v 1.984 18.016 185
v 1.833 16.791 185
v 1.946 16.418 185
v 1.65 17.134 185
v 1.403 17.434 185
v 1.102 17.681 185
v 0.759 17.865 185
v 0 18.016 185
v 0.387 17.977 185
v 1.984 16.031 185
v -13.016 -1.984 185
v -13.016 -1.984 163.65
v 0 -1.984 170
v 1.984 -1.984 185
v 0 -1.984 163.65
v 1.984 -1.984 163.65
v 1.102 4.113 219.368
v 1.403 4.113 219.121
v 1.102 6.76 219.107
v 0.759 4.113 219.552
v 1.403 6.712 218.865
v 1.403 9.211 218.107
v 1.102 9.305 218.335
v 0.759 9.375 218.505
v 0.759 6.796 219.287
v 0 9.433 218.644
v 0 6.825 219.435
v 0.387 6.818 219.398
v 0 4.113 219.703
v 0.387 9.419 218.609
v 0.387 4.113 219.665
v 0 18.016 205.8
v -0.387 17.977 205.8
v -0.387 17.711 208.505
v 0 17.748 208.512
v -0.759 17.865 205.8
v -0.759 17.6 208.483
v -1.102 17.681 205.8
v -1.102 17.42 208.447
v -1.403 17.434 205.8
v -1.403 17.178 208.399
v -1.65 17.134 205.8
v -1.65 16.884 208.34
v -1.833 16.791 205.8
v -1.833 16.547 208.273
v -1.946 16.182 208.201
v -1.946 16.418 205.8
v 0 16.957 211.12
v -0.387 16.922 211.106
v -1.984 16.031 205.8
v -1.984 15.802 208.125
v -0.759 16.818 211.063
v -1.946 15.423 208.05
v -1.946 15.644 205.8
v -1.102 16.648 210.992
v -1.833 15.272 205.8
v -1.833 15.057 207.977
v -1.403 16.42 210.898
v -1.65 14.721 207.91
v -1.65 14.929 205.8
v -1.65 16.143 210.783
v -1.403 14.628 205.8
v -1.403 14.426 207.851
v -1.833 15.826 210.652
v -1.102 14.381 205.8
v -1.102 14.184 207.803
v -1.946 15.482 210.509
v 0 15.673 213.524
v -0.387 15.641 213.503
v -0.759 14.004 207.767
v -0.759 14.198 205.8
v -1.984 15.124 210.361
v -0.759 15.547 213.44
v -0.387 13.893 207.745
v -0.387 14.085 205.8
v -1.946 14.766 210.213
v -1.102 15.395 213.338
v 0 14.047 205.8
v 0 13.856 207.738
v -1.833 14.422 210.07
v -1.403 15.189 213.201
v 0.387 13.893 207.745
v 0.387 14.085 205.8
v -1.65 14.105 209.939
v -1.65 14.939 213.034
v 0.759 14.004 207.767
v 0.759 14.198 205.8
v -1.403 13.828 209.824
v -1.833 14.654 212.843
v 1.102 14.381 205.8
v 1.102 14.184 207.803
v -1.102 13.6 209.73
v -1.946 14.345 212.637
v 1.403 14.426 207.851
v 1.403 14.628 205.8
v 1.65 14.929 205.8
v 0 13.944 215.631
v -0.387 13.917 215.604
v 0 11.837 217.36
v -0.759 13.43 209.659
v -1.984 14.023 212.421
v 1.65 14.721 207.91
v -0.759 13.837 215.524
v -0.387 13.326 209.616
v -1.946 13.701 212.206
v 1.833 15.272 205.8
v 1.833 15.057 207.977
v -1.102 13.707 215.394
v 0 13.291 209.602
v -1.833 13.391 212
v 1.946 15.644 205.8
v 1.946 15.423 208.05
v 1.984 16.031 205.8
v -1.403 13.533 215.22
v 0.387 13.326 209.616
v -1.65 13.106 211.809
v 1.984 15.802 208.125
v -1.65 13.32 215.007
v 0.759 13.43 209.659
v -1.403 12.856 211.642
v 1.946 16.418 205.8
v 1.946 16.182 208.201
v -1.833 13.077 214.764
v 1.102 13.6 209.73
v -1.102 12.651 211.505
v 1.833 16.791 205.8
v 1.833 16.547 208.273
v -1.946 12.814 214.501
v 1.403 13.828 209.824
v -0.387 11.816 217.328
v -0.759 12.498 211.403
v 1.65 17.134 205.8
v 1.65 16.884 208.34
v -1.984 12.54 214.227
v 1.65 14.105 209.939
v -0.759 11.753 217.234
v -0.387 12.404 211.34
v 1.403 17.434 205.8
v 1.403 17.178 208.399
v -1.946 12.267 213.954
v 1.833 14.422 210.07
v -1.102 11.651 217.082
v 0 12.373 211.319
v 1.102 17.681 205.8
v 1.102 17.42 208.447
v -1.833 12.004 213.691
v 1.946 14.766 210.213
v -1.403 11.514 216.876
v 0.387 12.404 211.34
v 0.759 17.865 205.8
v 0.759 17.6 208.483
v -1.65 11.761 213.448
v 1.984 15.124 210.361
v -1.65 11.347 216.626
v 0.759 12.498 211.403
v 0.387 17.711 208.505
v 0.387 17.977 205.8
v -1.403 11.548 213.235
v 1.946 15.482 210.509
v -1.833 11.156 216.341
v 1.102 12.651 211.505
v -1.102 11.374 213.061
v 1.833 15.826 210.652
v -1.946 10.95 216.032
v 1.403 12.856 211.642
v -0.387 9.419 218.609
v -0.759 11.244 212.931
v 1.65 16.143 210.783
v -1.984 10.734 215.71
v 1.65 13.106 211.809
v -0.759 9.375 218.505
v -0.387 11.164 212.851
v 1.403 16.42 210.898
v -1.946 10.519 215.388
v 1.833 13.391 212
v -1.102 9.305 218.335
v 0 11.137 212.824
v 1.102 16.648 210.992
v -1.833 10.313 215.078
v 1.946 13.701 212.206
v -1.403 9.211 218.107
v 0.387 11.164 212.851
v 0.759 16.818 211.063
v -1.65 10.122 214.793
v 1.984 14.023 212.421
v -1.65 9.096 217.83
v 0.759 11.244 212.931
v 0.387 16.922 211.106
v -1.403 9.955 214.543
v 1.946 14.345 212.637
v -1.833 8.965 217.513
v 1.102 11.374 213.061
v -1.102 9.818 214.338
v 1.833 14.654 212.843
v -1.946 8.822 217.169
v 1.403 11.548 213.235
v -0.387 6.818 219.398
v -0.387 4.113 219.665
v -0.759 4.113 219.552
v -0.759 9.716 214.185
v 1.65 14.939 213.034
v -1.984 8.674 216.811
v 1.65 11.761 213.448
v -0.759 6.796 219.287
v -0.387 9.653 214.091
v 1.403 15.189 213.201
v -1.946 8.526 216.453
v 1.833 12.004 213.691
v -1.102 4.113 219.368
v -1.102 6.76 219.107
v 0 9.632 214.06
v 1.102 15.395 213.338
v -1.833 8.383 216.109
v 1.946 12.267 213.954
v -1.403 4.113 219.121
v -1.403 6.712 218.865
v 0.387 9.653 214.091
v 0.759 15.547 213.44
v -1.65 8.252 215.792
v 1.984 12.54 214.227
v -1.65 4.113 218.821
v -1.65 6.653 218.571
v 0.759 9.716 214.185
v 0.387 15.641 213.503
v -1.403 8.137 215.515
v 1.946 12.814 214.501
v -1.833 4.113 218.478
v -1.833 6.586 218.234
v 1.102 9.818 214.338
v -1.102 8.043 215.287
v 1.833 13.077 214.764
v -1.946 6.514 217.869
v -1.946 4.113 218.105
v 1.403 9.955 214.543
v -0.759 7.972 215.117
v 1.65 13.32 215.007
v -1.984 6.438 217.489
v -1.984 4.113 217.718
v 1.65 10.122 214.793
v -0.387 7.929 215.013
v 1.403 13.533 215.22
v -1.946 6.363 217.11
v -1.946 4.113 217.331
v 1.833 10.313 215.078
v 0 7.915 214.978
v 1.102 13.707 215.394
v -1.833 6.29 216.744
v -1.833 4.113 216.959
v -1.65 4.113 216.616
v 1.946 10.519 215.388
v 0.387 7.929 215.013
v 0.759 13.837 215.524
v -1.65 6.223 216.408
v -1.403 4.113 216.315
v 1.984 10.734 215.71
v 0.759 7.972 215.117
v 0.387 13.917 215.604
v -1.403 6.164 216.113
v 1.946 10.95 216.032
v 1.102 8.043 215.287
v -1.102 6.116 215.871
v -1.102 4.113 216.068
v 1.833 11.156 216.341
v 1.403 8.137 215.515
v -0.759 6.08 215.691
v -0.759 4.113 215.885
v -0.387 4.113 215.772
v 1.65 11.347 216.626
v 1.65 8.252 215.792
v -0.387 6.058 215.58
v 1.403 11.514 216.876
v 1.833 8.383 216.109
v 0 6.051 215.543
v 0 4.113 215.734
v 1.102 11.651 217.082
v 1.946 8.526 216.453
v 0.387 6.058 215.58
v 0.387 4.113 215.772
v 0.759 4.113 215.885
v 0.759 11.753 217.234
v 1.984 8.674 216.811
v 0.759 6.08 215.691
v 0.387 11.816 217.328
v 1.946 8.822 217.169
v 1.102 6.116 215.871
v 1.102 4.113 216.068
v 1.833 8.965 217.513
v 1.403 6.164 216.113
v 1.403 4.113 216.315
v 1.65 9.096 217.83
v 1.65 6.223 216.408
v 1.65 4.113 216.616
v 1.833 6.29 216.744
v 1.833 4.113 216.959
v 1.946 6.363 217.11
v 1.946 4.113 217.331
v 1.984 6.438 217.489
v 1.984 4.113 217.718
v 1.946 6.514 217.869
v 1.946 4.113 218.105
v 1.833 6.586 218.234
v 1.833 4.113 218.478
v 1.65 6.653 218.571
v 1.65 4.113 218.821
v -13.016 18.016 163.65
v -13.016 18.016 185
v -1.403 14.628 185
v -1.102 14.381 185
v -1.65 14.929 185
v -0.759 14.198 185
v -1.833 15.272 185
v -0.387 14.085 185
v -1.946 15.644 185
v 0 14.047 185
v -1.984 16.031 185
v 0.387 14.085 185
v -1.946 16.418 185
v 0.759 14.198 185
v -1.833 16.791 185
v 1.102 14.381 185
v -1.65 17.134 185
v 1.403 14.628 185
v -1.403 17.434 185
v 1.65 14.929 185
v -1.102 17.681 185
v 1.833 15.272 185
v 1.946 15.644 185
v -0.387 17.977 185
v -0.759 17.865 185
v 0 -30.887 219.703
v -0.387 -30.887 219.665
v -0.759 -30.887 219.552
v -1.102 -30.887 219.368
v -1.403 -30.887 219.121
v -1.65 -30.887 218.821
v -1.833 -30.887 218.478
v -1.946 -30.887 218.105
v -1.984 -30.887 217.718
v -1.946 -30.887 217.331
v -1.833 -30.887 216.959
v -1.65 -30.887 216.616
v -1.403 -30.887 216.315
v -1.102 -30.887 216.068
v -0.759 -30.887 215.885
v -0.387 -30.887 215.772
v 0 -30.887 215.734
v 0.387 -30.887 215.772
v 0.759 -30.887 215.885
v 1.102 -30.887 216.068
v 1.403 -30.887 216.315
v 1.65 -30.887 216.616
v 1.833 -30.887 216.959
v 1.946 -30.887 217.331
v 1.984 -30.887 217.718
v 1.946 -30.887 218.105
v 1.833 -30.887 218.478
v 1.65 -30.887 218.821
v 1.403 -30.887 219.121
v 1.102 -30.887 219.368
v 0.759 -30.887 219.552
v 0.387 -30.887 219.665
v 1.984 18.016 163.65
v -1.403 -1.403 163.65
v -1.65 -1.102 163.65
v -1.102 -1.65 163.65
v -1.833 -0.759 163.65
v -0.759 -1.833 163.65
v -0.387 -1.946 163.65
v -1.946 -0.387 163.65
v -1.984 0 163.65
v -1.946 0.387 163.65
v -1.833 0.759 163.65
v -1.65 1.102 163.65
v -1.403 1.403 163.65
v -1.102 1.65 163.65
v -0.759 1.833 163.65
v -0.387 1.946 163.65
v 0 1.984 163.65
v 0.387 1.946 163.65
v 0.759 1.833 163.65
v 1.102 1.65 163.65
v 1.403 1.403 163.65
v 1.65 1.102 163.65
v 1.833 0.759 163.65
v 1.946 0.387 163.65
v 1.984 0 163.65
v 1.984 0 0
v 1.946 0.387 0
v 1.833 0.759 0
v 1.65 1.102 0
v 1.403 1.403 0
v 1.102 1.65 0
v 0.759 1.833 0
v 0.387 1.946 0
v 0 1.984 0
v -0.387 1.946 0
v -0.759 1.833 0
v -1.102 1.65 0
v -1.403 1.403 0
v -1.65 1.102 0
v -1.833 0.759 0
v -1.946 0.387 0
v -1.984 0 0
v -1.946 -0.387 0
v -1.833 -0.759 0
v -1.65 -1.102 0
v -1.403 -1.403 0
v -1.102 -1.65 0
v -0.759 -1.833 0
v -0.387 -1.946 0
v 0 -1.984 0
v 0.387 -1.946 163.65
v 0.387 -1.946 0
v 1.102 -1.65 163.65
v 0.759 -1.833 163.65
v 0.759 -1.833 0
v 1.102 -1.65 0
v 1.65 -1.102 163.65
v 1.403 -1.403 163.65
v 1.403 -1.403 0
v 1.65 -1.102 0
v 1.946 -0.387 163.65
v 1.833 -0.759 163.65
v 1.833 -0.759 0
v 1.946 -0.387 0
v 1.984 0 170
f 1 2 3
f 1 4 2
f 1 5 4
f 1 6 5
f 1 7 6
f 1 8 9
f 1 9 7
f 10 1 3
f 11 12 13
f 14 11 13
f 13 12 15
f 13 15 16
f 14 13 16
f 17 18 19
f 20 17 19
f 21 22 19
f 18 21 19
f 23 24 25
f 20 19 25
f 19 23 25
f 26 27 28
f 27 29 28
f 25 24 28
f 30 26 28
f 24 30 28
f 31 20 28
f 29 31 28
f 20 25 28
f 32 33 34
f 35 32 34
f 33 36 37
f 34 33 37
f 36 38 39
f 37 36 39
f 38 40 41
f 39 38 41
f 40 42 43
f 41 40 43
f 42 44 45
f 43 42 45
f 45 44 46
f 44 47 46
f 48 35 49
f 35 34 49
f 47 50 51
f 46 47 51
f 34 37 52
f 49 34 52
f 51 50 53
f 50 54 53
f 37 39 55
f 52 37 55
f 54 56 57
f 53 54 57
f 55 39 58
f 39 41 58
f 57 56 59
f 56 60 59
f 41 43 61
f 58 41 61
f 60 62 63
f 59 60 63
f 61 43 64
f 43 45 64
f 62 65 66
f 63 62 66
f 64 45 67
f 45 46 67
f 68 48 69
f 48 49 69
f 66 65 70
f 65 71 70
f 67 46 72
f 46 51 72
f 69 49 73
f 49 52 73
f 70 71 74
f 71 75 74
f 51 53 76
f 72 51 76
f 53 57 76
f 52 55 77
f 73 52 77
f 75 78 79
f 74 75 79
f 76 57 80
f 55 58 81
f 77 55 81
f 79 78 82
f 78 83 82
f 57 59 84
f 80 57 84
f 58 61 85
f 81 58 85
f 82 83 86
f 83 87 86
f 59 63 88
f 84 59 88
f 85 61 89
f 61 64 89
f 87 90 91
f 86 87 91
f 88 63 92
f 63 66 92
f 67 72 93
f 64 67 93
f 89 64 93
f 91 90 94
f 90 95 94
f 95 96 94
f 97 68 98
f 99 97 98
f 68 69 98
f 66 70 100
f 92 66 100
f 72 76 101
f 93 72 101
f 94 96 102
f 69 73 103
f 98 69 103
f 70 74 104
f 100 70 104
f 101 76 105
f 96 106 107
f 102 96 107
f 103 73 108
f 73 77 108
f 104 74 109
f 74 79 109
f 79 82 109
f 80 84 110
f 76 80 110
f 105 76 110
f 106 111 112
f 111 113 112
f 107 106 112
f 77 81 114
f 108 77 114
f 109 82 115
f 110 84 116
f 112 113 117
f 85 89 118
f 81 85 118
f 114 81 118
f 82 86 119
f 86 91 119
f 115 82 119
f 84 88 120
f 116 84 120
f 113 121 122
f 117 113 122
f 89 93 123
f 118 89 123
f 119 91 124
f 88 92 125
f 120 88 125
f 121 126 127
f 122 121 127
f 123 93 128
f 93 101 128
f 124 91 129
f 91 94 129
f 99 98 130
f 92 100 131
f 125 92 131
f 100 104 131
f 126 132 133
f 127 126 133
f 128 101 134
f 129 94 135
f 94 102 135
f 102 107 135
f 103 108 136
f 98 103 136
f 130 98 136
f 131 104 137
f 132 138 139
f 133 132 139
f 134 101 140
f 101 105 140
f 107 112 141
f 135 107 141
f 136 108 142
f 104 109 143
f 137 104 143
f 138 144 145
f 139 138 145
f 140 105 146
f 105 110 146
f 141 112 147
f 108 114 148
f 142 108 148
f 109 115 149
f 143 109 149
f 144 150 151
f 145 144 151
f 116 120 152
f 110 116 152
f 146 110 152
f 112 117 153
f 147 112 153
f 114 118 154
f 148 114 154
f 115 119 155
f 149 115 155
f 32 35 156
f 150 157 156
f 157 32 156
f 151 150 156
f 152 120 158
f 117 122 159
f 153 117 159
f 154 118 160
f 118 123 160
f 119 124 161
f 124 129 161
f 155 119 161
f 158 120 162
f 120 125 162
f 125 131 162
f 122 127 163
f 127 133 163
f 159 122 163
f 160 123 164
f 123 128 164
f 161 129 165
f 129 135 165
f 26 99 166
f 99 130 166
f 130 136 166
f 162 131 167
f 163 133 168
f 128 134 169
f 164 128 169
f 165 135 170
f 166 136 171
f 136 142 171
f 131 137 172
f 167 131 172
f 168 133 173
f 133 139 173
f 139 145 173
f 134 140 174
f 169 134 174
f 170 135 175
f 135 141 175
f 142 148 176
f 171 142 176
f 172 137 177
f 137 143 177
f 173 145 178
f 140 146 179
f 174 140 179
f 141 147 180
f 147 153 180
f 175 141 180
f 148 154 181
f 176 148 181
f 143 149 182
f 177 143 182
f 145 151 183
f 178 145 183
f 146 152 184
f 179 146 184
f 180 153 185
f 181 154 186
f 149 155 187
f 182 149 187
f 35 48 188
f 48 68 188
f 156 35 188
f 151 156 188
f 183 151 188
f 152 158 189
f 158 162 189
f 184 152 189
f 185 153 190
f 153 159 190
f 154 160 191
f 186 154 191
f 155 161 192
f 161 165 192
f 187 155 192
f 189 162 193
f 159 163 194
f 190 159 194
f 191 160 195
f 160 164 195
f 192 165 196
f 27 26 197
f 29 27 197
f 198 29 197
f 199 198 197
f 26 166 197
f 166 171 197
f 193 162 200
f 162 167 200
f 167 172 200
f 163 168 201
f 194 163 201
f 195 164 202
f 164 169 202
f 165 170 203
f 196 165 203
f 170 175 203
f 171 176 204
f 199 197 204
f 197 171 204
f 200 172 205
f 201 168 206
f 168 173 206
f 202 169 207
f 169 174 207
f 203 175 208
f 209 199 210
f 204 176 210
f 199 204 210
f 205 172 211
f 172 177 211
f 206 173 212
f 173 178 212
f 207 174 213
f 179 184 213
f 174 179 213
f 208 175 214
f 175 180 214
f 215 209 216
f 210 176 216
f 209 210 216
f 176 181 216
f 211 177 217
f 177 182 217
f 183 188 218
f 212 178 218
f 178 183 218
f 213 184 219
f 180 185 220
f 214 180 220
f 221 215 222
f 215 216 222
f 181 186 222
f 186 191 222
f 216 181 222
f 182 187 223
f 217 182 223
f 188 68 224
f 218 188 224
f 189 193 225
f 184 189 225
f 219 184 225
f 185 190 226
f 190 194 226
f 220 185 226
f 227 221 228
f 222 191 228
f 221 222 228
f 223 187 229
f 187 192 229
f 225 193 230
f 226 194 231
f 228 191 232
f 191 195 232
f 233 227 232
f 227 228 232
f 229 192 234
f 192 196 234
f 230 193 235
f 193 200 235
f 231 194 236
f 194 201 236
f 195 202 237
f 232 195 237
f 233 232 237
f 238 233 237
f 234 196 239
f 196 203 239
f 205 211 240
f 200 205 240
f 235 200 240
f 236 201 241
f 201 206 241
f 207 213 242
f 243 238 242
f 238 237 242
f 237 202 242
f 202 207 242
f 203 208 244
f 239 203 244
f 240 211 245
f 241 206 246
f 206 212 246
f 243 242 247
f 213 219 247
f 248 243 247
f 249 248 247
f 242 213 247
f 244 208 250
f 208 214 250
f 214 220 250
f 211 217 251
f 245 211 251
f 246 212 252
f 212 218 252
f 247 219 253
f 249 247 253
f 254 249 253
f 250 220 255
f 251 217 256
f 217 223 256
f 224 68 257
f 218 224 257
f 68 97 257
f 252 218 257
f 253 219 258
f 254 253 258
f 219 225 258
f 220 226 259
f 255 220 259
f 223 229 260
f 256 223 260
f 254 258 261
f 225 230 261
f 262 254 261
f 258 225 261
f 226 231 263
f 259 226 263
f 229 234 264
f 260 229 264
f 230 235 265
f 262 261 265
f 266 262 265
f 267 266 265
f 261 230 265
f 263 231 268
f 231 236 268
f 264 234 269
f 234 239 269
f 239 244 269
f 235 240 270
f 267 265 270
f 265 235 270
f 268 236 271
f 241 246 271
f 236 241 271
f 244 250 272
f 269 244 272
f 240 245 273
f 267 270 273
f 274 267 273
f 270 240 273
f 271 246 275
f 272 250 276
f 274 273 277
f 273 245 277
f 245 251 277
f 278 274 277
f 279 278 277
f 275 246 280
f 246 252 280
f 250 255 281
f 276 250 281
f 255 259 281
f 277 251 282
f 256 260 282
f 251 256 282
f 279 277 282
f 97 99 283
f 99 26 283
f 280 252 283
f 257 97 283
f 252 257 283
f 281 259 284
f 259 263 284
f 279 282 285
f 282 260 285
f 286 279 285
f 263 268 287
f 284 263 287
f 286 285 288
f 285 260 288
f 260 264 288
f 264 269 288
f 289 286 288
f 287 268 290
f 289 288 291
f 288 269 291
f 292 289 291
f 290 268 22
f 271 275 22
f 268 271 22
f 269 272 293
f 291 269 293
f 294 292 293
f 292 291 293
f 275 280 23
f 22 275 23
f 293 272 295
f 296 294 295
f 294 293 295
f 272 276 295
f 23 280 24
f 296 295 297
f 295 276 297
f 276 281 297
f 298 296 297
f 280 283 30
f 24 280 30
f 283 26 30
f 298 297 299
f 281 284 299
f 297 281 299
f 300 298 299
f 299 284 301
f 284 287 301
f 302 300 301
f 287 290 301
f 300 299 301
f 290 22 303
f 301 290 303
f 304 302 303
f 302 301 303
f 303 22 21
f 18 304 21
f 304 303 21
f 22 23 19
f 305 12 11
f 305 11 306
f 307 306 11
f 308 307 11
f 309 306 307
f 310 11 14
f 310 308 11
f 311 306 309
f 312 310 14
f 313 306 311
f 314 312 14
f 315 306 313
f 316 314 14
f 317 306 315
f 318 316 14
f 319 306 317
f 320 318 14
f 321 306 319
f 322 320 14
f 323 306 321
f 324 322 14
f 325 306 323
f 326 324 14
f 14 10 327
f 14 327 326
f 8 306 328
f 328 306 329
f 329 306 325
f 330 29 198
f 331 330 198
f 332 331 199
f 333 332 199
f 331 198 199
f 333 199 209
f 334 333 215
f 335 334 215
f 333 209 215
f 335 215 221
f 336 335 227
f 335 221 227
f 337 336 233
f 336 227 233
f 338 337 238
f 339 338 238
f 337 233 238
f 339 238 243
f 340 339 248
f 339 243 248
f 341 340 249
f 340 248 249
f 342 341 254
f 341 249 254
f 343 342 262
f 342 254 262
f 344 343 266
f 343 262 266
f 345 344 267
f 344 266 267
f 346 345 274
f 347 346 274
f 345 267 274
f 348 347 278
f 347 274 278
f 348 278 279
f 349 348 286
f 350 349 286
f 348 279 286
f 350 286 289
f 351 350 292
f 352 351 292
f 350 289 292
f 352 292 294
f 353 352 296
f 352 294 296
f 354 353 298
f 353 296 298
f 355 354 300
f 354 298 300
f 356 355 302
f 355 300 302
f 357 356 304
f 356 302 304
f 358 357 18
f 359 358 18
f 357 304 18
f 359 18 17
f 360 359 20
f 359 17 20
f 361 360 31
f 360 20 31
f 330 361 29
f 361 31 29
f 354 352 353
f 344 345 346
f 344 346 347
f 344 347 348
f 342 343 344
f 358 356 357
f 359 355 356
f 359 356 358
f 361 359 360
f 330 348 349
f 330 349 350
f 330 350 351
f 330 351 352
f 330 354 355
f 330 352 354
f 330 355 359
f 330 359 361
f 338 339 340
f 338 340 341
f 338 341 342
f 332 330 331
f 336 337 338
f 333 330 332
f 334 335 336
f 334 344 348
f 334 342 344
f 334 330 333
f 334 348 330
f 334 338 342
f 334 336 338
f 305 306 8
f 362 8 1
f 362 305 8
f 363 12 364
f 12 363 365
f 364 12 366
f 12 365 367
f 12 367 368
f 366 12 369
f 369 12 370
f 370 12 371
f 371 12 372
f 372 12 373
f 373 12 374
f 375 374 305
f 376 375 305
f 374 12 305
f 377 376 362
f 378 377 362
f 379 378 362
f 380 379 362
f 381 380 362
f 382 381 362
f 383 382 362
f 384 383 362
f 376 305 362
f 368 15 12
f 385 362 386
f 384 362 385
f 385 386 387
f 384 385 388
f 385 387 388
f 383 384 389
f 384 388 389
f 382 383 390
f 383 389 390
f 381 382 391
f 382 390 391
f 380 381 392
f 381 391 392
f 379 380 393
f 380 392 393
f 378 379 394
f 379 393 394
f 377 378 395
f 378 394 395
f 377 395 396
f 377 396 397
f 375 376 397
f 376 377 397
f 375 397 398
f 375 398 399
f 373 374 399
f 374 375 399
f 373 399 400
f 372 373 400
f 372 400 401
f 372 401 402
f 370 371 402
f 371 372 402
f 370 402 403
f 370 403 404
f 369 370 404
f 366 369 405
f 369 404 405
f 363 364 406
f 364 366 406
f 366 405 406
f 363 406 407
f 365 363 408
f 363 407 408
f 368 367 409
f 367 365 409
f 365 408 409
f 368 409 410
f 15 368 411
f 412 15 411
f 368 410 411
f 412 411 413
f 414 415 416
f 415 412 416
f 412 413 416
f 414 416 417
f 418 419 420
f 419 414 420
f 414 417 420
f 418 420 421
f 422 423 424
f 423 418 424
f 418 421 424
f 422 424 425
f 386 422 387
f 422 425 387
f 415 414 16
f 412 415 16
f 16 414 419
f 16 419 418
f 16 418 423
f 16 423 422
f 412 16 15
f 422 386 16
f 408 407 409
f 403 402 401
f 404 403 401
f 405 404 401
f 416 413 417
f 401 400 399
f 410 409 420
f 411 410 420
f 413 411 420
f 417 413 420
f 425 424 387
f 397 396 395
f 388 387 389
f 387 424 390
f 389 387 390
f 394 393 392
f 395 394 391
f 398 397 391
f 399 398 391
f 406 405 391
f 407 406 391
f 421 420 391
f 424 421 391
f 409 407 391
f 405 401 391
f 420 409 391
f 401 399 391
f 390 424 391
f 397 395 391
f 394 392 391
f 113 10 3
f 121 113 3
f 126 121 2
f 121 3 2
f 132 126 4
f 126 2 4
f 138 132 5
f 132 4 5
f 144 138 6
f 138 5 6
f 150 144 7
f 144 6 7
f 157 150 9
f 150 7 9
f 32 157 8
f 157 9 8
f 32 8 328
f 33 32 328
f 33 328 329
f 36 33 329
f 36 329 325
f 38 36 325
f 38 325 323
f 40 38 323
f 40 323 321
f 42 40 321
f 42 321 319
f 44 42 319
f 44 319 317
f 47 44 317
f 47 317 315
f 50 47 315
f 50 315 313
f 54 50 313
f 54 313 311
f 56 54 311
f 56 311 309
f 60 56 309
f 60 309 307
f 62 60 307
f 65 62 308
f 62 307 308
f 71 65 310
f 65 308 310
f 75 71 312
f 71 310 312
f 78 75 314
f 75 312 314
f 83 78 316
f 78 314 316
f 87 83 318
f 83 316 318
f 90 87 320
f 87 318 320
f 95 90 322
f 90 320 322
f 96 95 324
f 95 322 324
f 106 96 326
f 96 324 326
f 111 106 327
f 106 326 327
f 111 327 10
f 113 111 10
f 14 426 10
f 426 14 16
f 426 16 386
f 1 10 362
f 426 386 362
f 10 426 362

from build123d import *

# Parameters (mm, degrees)
SKETCH1_R                = 1.984375
BOSS_EXTRUDE1_DEPTH      = 170
BOSS_EXTRUDE2_DEPTH      = 15
BOSS_EXTRUDE2_DEPTH_BACK = 6.35
SKETCH2_W                = 15
SKETCH2_H                = 20
SKETCH3_R                = 1.984375
BOSS_EXTRUDE3_DEPTH      = 20.799999976
SKETCH4_R                = 1.984375
REVOLVE5_ANGLE           = 90
SKETCH6_R                = 1.984375
BOSS_EXTRUDE4_DEPTH      = 35.000000038


with BuildPart() as part:
    # Sketch1 → Boss-Extrude1 (new body)
    with BuildSketch(Plane.XY):
        Circle(SKETCH1_R)
    extrude(amount=BOSS_EXTRUDE1_DEPTH)

    # Sketch2 → Boss-Extrude2 (add, two sides: drawn at the far end of the back side and taken through both)
    with BuildSketch(Plane.XY.offset(170).offset(-BOSS_EXTRUDE2_DEPTH_BACK)):
        with Locations((-5.515625, 8.015625)):
            Rectangle(SKETCH2_W, SKETCH2_H)
    extrude(amount=BOSS_EXTRUDE2_DEPTH + BOSS_EXTRUDE2_DEPTH_BACK)

    # Sketch3 → Boss-Extrude3 (add)
    with BuildSketch(Plane.XY.offset(185)):
        with Locations((0, 16.03125)):
            Circle(SKETCH3_R)
    extrude(amount=BOSS_EXTRUDE3_DEPTH)

    # Sketch4 → Revolve5 (revolve)
    with BuildSketch(Plane.XY.offset(205.799999976)):
        with Locations(Location((0, 16.03125, 0), (0, 0, 90))):
            Circle(SKETCH4_R)
    revolve(axis=Axis((-5.972283048, 4.112992181, 205.799999976), (1, 0, 0)), revolution_arc=REVOLVE5_ANGLE)

    # Sketch6 → Boss-Extrude4 (add)
    with BuildSketch(Plane.XZ.offset(-4.112992181)):
        with Locations(Location((0, 217.718257795, 0), (0, 0, 90))):
            Circle(SKETCH6_R)
    extrude(amount=BOSS_EXTRUDE4_DEPTH)


solid = part.part
